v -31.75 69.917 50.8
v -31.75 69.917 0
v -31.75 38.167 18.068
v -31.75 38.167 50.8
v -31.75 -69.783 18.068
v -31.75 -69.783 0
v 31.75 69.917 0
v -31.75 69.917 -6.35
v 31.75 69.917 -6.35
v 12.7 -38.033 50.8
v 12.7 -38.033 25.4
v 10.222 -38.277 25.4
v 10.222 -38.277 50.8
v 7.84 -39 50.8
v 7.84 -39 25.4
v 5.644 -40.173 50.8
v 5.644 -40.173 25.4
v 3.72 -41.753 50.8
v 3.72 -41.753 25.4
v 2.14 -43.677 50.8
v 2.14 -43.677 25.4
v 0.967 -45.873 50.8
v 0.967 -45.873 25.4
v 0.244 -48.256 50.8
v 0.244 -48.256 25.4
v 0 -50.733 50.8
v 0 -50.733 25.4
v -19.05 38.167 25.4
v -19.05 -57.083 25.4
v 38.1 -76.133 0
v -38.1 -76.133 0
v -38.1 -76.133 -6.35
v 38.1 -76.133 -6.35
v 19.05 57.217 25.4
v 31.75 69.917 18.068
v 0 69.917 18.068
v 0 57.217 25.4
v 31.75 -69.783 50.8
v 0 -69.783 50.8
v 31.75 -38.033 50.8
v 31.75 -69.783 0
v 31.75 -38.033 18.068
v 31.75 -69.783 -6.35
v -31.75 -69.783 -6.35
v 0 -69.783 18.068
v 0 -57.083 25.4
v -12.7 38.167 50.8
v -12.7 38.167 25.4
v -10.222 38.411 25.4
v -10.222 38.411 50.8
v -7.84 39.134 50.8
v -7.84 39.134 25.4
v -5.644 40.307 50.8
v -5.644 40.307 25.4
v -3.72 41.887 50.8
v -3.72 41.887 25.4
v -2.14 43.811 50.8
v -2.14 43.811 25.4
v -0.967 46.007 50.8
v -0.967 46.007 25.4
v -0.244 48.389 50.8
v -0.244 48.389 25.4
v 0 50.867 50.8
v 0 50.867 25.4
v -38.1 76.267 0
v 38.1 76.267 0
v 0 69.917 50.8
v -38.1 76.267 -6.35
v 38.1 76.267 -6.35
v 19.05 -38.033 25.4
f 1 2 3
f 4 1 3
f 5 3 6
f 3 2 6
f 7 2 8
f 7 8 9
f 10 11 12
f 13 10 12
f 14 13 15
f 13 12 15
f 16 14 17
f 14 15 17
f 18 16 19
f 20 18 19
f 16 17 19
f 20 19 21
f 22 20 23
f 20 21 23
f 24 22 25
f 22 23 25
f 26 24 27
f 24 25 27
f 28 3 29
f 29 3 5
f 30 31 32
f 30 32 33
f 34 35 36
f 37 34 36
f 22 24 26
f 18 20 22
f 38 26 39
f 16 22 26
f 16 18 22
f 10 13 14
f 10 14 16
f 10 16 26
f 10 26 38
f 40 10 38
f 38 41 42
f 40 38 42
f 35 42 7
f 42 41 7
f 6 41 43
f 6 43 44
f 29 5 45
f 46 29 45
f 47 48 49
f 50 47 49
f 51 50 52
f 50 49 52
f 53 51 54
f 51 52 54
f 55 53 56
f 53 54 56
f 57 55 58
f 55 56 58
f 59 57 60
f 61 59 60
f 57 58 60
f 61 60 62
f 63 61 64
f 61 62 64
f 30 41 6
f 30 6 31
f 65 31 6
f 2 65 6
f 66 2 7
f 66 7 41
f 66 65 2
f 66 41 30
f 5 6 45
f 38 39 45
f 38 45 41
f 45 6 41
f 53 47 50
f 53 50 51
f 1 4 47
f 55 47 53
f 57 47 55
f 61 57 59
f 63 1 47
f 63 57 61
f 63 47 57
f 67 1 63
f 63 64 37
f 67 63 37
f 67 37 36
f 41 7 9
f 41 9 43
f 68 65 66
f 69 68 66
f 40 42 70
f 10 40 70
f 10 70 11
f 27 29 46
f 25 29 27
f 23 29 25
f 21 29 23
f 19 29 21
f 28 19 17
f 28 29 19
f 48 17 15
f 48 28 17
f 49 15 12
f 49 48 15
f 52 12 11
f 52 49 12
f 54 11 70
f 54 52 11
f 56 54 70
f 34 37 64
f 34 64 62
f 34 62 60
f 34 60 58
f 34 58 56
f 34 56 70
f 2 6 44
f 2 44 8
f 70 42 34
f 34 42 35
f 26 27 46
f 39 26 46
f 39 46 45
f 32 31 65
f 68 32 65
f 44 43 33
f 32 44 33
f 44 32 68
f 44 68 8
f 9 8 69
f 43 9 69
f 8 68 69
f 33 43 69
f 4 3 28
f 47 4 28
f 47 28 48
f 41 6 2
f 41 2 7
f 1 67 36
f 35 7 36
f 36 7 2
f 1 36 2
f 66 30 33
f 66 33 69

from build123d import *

# Parameters (mm, degrees)
F0_W     = 76.2
F0_H     = 152.4
F1_DEPTH = 6.35
F2_DEPTH = 25.4
F3_SIZE2 = 7.3323484187
F3_SIZE  = 12.7
F4_DEPTH = 50.8


with BuildPart() as f1:
    # F0 (on Top) → F1 (new body)
    with BuildSketch(Plane.XY):
        with Locations((0, 0.0668413997)):
            Rectangle(F0_W, F0_H)
        Polygon((-31.75, 38.1668413997), (-31.75, 69.9168413997), (0, 69.9168413997), (31.75, 69.9168413997), (31.75, -38.0331586003), (31.75, -69.7831586003), (0, -69.7831586003), (-31.75, -69.7831586003), align=None, mode=Mode.SUBTRACT)
    extrude(amount=-F1_DEPTH)



with BuildPart() as f2:
    # F0 (on Top) → F2 (new body)
    with BuildSketch(Plane.XY):
        with BuildLine():
            Line((31.75, 69.9168413997), (0, 69.9168413997))
            Line((0, 69.9168413997), (0, 50.8668413997))
            ThreePointArc((0, 50.8668413997), (-3.7197438789, 41.8865852786), (-12.7, 38.1668413997))
            Line((-12.7, 38.1668413997), (-31.75, 38.1668413997))
            Line((-31.75, 38.1668413997), (-31.75, -69.7831586003))
            Line((-31.75, -69.7831586003), (0, -69.7831586003))
            Line((0, -69.7831586003), (0, -50.7331586003))
            ThreePointArc((0, -50.7331586003), (3.7197438789, -41.7529024793), (12.7, -38.0331586003))
            Line((12.7, -38.0331586003), (31.75, -38.0331586003))
            Line((31.75, -38.0331586003), (31.75, 69.9168413997))
        make_face()
    extrude(amount=F2_DEPTH)

    # F3
    f3_edges = [f2.edges().sort_by_distance(p)[0] for p in [
        (-15.875, -69.783159, 25.4),
        (-31.75, -15.808159, 25.4),
        (31.75, 15.941841, 25.4),
        (15.875, 69.916841, 25.4),
    ]]
    f3_side = f2.faces().sort_by_distance((0, 0.066841, 25.4))[0]
    chamfer(f3_edges, length=F3_SIZE, length2=F3_SIZE2, reference=f3_side)


with BuildPart() as f1_1:
    add(f1.part)

    add(f2.part)  # F4 merges F2
    # F0 (on Top) → F4 (join)
    with BuildSketch(Plane.XY):
        with BuildLine():
            Line((0, 69.9168413997), (-31.75, 69.9168413997))
            Line((-31.75, 69.9168413997), (-31.75, 38.1668413997))
            Line((-31.75, 38.1668413997), (-12.7, 38.1668413997))
            ThreePointArc((-12.7, 38.1668413997), (-3.7197438789, 41.8865852786), (0, 50.8668413997))
            Line((0, 50.8668413997), (0, 69.9168413997))
        make_face()
        with BuildLine():
            Line((31.75, -69.7831586003), (31.75, -38.0331586003))
            Line((31.75, -38.0331586003), (12.7, -38.0331586003))
            ThreePointArc((12.7, -38.0331586003), (3.7197438789, -41.7529024793), (0, -50.7331586003))
            Line((0, -50.7331586003), (0, -69.7831586003))
            Line((0, -69.7831586003), (31.75, -69.7831586003))
        make_face()
    extrude(amount=F4_DEPTH)


solid = f1_1.part
